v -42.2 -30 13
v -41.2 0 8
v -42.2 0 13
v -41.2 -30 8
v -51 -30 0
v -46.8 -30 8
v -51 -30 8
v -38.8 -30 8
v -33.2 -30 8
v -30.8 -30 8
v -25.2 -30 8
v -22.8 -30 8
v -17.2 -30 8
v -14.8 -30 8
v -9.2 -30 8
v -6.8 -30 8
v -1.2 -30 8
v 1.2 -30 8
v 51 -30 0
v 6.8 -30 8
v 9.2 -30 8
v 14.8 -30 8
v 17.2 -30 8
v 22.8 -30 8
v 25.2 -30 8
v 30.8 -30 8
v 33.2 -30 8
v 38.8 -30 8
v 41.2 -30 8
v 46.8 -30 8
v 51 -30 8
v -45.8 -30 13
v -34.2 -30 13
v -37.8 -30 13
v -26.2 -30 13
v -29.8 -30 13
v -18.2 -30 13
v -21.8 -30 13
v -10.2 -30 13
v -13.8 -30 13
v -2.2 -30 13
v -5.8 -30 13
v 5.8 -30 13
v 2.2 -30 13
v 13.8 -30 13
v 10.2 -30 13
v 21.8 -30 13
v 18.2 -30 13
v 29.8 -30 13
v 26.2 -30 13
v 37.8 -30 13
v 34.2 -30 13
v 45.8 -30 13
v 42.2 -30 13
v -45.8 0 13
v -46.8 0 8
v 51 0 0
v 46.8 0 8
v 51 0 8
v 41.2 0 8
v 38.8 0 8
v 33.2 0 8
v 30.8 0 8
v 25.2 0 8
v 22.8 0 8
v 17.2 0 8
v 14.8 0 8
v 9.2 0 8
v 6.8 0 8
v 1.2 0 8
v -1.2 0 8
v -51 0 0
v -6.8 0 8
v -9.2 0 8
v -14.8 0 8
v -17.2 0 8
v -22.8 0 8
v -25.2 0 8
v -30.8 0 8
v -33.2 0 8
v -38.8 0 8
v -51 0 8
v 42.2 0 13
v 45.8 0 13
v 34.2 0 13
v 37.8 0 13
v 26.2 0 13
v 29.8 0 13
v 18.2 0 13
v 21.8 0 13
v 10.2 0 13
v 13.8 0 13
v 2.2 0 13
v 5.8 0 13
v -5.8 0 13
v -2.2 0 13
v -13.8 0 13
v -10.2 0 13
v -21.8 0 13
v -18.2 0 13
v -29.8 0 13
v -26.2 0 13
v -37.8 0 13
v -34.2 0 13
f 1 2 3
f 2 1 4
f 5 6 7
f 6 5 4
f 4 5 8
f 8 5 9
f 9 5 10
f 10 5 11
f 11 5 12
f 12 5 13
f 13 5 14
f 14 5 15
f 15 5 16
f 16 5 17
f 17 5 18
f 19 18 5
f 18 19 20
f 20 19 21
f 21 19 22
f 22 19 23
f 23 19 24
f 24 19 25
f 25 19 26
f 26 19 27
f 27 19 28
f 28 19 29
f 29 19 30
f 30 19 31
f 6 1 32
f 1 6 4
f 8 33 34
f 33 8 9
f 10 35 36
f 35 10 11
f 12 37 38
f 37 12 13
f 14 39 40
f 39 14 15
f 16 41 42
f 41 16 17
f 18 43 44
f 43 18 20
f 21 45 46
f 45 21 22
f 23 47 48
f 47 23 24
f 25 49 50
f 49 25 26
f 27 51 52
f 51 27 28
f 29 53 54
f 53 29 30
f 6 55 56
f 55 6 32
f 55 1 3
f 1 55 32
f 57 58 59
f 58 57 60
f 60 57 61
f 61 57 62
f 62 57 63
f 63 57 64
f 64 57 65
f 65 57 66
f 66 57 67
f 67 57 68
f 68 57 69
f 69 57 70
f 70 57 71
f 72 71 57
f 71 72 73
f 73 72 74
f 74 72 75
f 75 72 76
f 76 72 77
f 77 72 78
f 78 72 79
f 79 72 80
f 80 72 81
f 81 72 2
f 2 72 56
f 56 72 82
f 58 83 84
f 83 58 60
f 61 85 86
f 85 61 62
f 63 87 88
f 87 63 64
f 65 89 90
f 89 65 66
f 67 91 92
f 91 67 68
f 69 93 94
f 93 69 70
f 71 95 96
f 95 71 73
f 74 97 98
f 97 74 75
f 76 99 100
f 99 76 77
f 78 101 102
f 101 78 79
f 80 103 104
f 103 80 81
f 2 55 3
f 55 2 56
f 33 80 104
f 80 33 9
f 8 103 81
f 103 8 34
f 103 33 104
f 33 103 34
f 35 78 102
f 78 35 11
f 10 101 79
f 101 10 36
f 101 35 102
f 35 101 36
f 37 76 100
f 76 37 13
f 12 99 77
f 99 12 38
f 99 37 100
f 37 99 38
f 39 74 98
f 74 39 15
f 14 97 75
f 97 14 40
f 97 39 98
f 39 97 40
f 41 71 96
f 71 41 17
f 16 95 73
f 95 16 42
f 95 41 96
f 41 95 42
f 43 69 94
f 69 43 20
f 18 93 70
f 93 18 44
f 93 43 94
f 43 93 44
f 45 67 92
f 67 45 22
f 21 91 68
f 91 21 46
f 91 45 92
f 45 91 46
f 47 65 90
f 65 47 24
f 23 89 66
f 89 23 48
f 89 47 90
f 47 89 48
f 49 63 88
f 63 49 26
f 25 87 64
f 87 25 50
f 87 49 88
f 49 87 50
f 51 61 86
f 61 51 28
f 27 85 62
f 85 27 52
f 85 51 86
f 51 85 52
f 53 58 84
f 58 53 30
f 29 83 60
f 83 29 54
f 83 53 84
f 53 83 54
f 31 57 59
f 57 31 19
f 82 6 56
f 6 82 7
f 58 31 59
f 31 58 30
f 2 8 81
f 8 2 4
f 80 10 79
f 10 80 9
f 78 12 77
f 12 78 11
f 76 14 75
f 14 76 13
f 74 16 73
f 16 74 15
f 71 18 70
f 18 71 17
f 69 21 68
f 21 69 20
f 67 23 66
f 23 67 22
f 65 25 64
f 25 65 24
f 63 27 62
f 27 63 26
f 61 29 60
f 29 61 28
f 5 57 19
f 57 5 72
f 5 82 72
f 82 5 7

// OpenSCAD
$fn = 32;

// ----------------------------------------------------------------------
// Toothed rack, 12 teeth
// 8 mm pitch, 5 mm teeth
// ----------------------------------------------------------------------

// --- parameters (mm) ---
bar_w = 30;     // bar width (Y)
bar_h = 8;      // bar height (Z)
teeth = 12;     // number of teeth
pitch = 8;      // tooth pitch
tooth_h = 5;    // tooth height above the bar
root_w = 6;     // tooth width at the root
crest_w = 3.6;  // tooth width at the crest

// --- derived feature positions (mm) ---
span = (teeth - 1) * pitch;  // = 88   distance between the outer teeth
bar_l = span + root_w + 8;   // = 102   bar length: teeth plus 4 mm at each end
tooth_x = -span / 2;         // = -44   X of the first tooth
height = bar_h + tooth_h;    // = 13   overall height
feature_centers = [
  [tooth_x + 0 * pitch, -bar_w / 2],
  [tooth_x + 1 * pitch, -bar_w / 2],
  [tooth_x + 2 * pitch, -bar_w / 2],
  [tooth_x + 3 * pitch, -bar_w / 2],
  [tooth_x + 4 * pitch, -bar_w / 2],
  [tooth_x + 5 * pitch, -bar_w / 2],
  [tooth_x + 6 * pitch, -bar_w / 2],
  [tooth_x + 7 * pitch, -bar_w / 2],
  [tooth_x + 8 * pitch, -bar_w / 2],
  [tooth_x + 9 * pitch, -bar_w / 2],
  [tooth_x + 10 * pitch, -bar_w / 2],
  [tooth_x + 11 * pitch, -bar_w / 2]
];   // tooth centre line, drives the tooth loop

// bar with a rack of teeth, one extruded trapezoium per centre
module rack_tooth() {
  linear_extrude(height = bar_w)
    polygon(points = [
      [0, 0],
      [root_w, 0],
      [root_w / 2 + crest_w / 2, tooth_h + 1],
      [root_w / 2 - crest_w / 2, tooth_h + 1]
    ]);
}

union() {
  translate([-bar_l / 2, -bar_w, 0]) cube([bar_l, bar_w, bar_h]);
  for (centre = feature_centers)
    translate([centre[0] - root_w / 2, 0, bar_h - 1]) rotate([90, 0, 0]) rack_tooth();
}
